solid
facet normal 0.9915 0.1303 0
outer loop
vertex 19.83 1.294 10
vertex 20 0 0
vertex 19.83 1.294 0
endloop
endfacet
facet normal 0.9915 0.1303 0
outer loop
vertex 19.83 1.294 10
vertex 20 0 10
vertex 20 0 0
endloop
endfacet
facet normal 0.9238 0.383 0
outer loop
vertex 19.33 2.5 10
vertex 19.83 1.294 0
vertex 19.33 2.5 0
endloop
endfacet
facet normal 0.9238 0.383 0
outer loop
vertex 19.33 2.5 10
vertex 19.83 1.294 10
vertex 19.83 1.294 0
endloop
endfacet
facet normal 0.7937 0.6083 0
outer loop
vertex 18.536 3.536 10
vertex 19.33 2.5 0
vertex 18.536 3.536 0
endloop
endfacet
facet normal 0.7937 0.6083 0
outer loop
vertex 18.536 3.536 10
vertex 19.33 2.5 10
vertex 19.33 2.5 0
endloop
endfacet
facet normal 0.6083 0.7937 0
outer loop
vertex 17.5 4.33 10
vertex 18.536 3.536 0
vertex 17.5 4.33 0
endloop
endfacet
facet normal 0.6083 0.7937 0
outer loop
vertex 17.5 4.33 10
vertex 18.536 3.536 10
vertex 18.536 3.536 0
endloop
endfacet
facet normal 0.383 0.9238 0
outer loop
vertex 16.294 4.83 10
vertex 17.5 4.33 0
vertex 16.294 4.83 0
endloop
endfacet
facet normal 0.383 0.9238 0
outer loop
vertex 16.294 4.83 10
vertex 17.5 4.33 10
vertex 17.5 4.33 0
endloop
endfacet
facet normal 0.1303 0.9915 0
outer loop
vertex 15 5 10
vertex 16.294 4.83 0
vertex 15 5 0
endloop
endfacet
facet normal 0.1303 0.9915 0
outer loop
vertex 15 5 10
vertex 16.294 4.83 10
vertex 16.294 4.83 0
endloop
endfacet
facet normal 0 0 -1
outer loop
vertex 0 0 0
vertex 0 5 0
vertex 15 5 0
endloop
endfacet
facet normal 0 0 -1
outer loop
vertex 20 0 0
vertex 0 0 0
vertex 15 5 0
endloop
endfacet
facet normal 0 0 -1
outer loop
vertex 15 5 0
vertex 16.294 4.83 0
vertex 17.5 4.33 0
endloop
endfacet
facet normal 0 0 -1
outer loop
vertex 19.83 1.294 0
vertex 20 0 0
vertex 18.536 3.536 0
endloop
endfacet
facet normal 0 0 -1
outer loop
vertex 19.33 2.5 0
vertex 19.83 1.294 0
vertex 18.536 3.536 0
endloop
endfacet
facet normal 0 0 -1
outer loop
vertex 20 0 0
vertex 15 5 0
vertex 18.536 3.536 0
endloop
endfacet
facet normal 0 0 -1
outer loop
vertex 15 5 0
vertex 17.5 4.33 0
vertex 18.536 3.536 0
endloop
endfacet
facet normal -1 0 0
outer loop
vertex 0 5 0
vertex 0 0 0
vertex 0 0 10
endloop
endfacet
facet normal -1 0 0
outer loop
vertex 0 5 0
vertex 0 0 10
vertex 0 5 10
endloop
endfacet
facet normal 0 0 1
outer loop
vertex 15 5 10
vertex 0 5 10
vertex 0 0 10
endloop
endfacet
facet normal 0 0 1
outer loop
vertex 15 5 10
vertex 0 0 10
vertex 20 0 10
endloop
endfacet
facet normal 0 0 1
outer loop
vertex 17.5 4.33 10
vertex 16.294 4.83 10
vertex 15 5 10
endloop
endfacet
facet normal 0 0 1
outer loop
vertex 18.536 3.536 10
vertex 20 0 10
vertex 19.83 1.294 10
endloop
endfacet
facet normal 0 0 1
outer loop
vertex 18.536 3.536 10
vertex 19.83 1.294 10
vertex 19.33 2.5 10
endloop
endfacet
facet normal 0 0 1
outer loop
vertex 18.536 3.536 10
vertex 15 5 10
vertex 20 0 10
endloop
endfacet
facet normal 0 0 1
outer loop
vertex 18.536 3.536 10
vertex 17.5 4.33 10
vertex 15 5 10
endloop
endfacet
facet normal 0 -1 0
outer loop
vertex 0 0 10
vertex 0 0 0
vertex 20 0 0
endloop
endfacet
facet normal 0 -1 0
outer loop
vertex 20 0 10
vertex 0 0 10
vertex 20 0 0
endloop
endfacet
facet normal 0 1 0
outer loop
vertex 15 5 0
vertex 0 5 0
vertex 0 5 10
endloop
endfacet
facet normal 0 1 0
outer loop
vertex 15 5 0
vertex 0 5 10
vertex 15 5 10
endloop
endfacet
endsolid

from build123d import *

# Parameters (mm, degrees)
ESQUISSE1_W        = 20
ESQUISSE1_H        = 5
BOSS_EXTRU_1_DEPTH = 10
CONG_1_R           = 5


with BuildPart() as part:
    # Esquisse1 → Boss.-Extru.1 (new body)
    with BuildSketch(Plane.XY):
        with Locations((10, 2.5)):
            Rectangle(ESQUISSE1_W, ESQUISSE1_H)
    extrude(amount=BOSS_EXTRU_1_DEPTH)

    # Congé1
    cong_1_edges = [part.edges().sort_by_distance(p)[0] for p in [
        (20, 5, 5),
    ]]
    fillet(cong_1_edges, radius=CONG_1_R - 0.0001)  # a hair under: the kernel refuses the full size


solid = part.part
